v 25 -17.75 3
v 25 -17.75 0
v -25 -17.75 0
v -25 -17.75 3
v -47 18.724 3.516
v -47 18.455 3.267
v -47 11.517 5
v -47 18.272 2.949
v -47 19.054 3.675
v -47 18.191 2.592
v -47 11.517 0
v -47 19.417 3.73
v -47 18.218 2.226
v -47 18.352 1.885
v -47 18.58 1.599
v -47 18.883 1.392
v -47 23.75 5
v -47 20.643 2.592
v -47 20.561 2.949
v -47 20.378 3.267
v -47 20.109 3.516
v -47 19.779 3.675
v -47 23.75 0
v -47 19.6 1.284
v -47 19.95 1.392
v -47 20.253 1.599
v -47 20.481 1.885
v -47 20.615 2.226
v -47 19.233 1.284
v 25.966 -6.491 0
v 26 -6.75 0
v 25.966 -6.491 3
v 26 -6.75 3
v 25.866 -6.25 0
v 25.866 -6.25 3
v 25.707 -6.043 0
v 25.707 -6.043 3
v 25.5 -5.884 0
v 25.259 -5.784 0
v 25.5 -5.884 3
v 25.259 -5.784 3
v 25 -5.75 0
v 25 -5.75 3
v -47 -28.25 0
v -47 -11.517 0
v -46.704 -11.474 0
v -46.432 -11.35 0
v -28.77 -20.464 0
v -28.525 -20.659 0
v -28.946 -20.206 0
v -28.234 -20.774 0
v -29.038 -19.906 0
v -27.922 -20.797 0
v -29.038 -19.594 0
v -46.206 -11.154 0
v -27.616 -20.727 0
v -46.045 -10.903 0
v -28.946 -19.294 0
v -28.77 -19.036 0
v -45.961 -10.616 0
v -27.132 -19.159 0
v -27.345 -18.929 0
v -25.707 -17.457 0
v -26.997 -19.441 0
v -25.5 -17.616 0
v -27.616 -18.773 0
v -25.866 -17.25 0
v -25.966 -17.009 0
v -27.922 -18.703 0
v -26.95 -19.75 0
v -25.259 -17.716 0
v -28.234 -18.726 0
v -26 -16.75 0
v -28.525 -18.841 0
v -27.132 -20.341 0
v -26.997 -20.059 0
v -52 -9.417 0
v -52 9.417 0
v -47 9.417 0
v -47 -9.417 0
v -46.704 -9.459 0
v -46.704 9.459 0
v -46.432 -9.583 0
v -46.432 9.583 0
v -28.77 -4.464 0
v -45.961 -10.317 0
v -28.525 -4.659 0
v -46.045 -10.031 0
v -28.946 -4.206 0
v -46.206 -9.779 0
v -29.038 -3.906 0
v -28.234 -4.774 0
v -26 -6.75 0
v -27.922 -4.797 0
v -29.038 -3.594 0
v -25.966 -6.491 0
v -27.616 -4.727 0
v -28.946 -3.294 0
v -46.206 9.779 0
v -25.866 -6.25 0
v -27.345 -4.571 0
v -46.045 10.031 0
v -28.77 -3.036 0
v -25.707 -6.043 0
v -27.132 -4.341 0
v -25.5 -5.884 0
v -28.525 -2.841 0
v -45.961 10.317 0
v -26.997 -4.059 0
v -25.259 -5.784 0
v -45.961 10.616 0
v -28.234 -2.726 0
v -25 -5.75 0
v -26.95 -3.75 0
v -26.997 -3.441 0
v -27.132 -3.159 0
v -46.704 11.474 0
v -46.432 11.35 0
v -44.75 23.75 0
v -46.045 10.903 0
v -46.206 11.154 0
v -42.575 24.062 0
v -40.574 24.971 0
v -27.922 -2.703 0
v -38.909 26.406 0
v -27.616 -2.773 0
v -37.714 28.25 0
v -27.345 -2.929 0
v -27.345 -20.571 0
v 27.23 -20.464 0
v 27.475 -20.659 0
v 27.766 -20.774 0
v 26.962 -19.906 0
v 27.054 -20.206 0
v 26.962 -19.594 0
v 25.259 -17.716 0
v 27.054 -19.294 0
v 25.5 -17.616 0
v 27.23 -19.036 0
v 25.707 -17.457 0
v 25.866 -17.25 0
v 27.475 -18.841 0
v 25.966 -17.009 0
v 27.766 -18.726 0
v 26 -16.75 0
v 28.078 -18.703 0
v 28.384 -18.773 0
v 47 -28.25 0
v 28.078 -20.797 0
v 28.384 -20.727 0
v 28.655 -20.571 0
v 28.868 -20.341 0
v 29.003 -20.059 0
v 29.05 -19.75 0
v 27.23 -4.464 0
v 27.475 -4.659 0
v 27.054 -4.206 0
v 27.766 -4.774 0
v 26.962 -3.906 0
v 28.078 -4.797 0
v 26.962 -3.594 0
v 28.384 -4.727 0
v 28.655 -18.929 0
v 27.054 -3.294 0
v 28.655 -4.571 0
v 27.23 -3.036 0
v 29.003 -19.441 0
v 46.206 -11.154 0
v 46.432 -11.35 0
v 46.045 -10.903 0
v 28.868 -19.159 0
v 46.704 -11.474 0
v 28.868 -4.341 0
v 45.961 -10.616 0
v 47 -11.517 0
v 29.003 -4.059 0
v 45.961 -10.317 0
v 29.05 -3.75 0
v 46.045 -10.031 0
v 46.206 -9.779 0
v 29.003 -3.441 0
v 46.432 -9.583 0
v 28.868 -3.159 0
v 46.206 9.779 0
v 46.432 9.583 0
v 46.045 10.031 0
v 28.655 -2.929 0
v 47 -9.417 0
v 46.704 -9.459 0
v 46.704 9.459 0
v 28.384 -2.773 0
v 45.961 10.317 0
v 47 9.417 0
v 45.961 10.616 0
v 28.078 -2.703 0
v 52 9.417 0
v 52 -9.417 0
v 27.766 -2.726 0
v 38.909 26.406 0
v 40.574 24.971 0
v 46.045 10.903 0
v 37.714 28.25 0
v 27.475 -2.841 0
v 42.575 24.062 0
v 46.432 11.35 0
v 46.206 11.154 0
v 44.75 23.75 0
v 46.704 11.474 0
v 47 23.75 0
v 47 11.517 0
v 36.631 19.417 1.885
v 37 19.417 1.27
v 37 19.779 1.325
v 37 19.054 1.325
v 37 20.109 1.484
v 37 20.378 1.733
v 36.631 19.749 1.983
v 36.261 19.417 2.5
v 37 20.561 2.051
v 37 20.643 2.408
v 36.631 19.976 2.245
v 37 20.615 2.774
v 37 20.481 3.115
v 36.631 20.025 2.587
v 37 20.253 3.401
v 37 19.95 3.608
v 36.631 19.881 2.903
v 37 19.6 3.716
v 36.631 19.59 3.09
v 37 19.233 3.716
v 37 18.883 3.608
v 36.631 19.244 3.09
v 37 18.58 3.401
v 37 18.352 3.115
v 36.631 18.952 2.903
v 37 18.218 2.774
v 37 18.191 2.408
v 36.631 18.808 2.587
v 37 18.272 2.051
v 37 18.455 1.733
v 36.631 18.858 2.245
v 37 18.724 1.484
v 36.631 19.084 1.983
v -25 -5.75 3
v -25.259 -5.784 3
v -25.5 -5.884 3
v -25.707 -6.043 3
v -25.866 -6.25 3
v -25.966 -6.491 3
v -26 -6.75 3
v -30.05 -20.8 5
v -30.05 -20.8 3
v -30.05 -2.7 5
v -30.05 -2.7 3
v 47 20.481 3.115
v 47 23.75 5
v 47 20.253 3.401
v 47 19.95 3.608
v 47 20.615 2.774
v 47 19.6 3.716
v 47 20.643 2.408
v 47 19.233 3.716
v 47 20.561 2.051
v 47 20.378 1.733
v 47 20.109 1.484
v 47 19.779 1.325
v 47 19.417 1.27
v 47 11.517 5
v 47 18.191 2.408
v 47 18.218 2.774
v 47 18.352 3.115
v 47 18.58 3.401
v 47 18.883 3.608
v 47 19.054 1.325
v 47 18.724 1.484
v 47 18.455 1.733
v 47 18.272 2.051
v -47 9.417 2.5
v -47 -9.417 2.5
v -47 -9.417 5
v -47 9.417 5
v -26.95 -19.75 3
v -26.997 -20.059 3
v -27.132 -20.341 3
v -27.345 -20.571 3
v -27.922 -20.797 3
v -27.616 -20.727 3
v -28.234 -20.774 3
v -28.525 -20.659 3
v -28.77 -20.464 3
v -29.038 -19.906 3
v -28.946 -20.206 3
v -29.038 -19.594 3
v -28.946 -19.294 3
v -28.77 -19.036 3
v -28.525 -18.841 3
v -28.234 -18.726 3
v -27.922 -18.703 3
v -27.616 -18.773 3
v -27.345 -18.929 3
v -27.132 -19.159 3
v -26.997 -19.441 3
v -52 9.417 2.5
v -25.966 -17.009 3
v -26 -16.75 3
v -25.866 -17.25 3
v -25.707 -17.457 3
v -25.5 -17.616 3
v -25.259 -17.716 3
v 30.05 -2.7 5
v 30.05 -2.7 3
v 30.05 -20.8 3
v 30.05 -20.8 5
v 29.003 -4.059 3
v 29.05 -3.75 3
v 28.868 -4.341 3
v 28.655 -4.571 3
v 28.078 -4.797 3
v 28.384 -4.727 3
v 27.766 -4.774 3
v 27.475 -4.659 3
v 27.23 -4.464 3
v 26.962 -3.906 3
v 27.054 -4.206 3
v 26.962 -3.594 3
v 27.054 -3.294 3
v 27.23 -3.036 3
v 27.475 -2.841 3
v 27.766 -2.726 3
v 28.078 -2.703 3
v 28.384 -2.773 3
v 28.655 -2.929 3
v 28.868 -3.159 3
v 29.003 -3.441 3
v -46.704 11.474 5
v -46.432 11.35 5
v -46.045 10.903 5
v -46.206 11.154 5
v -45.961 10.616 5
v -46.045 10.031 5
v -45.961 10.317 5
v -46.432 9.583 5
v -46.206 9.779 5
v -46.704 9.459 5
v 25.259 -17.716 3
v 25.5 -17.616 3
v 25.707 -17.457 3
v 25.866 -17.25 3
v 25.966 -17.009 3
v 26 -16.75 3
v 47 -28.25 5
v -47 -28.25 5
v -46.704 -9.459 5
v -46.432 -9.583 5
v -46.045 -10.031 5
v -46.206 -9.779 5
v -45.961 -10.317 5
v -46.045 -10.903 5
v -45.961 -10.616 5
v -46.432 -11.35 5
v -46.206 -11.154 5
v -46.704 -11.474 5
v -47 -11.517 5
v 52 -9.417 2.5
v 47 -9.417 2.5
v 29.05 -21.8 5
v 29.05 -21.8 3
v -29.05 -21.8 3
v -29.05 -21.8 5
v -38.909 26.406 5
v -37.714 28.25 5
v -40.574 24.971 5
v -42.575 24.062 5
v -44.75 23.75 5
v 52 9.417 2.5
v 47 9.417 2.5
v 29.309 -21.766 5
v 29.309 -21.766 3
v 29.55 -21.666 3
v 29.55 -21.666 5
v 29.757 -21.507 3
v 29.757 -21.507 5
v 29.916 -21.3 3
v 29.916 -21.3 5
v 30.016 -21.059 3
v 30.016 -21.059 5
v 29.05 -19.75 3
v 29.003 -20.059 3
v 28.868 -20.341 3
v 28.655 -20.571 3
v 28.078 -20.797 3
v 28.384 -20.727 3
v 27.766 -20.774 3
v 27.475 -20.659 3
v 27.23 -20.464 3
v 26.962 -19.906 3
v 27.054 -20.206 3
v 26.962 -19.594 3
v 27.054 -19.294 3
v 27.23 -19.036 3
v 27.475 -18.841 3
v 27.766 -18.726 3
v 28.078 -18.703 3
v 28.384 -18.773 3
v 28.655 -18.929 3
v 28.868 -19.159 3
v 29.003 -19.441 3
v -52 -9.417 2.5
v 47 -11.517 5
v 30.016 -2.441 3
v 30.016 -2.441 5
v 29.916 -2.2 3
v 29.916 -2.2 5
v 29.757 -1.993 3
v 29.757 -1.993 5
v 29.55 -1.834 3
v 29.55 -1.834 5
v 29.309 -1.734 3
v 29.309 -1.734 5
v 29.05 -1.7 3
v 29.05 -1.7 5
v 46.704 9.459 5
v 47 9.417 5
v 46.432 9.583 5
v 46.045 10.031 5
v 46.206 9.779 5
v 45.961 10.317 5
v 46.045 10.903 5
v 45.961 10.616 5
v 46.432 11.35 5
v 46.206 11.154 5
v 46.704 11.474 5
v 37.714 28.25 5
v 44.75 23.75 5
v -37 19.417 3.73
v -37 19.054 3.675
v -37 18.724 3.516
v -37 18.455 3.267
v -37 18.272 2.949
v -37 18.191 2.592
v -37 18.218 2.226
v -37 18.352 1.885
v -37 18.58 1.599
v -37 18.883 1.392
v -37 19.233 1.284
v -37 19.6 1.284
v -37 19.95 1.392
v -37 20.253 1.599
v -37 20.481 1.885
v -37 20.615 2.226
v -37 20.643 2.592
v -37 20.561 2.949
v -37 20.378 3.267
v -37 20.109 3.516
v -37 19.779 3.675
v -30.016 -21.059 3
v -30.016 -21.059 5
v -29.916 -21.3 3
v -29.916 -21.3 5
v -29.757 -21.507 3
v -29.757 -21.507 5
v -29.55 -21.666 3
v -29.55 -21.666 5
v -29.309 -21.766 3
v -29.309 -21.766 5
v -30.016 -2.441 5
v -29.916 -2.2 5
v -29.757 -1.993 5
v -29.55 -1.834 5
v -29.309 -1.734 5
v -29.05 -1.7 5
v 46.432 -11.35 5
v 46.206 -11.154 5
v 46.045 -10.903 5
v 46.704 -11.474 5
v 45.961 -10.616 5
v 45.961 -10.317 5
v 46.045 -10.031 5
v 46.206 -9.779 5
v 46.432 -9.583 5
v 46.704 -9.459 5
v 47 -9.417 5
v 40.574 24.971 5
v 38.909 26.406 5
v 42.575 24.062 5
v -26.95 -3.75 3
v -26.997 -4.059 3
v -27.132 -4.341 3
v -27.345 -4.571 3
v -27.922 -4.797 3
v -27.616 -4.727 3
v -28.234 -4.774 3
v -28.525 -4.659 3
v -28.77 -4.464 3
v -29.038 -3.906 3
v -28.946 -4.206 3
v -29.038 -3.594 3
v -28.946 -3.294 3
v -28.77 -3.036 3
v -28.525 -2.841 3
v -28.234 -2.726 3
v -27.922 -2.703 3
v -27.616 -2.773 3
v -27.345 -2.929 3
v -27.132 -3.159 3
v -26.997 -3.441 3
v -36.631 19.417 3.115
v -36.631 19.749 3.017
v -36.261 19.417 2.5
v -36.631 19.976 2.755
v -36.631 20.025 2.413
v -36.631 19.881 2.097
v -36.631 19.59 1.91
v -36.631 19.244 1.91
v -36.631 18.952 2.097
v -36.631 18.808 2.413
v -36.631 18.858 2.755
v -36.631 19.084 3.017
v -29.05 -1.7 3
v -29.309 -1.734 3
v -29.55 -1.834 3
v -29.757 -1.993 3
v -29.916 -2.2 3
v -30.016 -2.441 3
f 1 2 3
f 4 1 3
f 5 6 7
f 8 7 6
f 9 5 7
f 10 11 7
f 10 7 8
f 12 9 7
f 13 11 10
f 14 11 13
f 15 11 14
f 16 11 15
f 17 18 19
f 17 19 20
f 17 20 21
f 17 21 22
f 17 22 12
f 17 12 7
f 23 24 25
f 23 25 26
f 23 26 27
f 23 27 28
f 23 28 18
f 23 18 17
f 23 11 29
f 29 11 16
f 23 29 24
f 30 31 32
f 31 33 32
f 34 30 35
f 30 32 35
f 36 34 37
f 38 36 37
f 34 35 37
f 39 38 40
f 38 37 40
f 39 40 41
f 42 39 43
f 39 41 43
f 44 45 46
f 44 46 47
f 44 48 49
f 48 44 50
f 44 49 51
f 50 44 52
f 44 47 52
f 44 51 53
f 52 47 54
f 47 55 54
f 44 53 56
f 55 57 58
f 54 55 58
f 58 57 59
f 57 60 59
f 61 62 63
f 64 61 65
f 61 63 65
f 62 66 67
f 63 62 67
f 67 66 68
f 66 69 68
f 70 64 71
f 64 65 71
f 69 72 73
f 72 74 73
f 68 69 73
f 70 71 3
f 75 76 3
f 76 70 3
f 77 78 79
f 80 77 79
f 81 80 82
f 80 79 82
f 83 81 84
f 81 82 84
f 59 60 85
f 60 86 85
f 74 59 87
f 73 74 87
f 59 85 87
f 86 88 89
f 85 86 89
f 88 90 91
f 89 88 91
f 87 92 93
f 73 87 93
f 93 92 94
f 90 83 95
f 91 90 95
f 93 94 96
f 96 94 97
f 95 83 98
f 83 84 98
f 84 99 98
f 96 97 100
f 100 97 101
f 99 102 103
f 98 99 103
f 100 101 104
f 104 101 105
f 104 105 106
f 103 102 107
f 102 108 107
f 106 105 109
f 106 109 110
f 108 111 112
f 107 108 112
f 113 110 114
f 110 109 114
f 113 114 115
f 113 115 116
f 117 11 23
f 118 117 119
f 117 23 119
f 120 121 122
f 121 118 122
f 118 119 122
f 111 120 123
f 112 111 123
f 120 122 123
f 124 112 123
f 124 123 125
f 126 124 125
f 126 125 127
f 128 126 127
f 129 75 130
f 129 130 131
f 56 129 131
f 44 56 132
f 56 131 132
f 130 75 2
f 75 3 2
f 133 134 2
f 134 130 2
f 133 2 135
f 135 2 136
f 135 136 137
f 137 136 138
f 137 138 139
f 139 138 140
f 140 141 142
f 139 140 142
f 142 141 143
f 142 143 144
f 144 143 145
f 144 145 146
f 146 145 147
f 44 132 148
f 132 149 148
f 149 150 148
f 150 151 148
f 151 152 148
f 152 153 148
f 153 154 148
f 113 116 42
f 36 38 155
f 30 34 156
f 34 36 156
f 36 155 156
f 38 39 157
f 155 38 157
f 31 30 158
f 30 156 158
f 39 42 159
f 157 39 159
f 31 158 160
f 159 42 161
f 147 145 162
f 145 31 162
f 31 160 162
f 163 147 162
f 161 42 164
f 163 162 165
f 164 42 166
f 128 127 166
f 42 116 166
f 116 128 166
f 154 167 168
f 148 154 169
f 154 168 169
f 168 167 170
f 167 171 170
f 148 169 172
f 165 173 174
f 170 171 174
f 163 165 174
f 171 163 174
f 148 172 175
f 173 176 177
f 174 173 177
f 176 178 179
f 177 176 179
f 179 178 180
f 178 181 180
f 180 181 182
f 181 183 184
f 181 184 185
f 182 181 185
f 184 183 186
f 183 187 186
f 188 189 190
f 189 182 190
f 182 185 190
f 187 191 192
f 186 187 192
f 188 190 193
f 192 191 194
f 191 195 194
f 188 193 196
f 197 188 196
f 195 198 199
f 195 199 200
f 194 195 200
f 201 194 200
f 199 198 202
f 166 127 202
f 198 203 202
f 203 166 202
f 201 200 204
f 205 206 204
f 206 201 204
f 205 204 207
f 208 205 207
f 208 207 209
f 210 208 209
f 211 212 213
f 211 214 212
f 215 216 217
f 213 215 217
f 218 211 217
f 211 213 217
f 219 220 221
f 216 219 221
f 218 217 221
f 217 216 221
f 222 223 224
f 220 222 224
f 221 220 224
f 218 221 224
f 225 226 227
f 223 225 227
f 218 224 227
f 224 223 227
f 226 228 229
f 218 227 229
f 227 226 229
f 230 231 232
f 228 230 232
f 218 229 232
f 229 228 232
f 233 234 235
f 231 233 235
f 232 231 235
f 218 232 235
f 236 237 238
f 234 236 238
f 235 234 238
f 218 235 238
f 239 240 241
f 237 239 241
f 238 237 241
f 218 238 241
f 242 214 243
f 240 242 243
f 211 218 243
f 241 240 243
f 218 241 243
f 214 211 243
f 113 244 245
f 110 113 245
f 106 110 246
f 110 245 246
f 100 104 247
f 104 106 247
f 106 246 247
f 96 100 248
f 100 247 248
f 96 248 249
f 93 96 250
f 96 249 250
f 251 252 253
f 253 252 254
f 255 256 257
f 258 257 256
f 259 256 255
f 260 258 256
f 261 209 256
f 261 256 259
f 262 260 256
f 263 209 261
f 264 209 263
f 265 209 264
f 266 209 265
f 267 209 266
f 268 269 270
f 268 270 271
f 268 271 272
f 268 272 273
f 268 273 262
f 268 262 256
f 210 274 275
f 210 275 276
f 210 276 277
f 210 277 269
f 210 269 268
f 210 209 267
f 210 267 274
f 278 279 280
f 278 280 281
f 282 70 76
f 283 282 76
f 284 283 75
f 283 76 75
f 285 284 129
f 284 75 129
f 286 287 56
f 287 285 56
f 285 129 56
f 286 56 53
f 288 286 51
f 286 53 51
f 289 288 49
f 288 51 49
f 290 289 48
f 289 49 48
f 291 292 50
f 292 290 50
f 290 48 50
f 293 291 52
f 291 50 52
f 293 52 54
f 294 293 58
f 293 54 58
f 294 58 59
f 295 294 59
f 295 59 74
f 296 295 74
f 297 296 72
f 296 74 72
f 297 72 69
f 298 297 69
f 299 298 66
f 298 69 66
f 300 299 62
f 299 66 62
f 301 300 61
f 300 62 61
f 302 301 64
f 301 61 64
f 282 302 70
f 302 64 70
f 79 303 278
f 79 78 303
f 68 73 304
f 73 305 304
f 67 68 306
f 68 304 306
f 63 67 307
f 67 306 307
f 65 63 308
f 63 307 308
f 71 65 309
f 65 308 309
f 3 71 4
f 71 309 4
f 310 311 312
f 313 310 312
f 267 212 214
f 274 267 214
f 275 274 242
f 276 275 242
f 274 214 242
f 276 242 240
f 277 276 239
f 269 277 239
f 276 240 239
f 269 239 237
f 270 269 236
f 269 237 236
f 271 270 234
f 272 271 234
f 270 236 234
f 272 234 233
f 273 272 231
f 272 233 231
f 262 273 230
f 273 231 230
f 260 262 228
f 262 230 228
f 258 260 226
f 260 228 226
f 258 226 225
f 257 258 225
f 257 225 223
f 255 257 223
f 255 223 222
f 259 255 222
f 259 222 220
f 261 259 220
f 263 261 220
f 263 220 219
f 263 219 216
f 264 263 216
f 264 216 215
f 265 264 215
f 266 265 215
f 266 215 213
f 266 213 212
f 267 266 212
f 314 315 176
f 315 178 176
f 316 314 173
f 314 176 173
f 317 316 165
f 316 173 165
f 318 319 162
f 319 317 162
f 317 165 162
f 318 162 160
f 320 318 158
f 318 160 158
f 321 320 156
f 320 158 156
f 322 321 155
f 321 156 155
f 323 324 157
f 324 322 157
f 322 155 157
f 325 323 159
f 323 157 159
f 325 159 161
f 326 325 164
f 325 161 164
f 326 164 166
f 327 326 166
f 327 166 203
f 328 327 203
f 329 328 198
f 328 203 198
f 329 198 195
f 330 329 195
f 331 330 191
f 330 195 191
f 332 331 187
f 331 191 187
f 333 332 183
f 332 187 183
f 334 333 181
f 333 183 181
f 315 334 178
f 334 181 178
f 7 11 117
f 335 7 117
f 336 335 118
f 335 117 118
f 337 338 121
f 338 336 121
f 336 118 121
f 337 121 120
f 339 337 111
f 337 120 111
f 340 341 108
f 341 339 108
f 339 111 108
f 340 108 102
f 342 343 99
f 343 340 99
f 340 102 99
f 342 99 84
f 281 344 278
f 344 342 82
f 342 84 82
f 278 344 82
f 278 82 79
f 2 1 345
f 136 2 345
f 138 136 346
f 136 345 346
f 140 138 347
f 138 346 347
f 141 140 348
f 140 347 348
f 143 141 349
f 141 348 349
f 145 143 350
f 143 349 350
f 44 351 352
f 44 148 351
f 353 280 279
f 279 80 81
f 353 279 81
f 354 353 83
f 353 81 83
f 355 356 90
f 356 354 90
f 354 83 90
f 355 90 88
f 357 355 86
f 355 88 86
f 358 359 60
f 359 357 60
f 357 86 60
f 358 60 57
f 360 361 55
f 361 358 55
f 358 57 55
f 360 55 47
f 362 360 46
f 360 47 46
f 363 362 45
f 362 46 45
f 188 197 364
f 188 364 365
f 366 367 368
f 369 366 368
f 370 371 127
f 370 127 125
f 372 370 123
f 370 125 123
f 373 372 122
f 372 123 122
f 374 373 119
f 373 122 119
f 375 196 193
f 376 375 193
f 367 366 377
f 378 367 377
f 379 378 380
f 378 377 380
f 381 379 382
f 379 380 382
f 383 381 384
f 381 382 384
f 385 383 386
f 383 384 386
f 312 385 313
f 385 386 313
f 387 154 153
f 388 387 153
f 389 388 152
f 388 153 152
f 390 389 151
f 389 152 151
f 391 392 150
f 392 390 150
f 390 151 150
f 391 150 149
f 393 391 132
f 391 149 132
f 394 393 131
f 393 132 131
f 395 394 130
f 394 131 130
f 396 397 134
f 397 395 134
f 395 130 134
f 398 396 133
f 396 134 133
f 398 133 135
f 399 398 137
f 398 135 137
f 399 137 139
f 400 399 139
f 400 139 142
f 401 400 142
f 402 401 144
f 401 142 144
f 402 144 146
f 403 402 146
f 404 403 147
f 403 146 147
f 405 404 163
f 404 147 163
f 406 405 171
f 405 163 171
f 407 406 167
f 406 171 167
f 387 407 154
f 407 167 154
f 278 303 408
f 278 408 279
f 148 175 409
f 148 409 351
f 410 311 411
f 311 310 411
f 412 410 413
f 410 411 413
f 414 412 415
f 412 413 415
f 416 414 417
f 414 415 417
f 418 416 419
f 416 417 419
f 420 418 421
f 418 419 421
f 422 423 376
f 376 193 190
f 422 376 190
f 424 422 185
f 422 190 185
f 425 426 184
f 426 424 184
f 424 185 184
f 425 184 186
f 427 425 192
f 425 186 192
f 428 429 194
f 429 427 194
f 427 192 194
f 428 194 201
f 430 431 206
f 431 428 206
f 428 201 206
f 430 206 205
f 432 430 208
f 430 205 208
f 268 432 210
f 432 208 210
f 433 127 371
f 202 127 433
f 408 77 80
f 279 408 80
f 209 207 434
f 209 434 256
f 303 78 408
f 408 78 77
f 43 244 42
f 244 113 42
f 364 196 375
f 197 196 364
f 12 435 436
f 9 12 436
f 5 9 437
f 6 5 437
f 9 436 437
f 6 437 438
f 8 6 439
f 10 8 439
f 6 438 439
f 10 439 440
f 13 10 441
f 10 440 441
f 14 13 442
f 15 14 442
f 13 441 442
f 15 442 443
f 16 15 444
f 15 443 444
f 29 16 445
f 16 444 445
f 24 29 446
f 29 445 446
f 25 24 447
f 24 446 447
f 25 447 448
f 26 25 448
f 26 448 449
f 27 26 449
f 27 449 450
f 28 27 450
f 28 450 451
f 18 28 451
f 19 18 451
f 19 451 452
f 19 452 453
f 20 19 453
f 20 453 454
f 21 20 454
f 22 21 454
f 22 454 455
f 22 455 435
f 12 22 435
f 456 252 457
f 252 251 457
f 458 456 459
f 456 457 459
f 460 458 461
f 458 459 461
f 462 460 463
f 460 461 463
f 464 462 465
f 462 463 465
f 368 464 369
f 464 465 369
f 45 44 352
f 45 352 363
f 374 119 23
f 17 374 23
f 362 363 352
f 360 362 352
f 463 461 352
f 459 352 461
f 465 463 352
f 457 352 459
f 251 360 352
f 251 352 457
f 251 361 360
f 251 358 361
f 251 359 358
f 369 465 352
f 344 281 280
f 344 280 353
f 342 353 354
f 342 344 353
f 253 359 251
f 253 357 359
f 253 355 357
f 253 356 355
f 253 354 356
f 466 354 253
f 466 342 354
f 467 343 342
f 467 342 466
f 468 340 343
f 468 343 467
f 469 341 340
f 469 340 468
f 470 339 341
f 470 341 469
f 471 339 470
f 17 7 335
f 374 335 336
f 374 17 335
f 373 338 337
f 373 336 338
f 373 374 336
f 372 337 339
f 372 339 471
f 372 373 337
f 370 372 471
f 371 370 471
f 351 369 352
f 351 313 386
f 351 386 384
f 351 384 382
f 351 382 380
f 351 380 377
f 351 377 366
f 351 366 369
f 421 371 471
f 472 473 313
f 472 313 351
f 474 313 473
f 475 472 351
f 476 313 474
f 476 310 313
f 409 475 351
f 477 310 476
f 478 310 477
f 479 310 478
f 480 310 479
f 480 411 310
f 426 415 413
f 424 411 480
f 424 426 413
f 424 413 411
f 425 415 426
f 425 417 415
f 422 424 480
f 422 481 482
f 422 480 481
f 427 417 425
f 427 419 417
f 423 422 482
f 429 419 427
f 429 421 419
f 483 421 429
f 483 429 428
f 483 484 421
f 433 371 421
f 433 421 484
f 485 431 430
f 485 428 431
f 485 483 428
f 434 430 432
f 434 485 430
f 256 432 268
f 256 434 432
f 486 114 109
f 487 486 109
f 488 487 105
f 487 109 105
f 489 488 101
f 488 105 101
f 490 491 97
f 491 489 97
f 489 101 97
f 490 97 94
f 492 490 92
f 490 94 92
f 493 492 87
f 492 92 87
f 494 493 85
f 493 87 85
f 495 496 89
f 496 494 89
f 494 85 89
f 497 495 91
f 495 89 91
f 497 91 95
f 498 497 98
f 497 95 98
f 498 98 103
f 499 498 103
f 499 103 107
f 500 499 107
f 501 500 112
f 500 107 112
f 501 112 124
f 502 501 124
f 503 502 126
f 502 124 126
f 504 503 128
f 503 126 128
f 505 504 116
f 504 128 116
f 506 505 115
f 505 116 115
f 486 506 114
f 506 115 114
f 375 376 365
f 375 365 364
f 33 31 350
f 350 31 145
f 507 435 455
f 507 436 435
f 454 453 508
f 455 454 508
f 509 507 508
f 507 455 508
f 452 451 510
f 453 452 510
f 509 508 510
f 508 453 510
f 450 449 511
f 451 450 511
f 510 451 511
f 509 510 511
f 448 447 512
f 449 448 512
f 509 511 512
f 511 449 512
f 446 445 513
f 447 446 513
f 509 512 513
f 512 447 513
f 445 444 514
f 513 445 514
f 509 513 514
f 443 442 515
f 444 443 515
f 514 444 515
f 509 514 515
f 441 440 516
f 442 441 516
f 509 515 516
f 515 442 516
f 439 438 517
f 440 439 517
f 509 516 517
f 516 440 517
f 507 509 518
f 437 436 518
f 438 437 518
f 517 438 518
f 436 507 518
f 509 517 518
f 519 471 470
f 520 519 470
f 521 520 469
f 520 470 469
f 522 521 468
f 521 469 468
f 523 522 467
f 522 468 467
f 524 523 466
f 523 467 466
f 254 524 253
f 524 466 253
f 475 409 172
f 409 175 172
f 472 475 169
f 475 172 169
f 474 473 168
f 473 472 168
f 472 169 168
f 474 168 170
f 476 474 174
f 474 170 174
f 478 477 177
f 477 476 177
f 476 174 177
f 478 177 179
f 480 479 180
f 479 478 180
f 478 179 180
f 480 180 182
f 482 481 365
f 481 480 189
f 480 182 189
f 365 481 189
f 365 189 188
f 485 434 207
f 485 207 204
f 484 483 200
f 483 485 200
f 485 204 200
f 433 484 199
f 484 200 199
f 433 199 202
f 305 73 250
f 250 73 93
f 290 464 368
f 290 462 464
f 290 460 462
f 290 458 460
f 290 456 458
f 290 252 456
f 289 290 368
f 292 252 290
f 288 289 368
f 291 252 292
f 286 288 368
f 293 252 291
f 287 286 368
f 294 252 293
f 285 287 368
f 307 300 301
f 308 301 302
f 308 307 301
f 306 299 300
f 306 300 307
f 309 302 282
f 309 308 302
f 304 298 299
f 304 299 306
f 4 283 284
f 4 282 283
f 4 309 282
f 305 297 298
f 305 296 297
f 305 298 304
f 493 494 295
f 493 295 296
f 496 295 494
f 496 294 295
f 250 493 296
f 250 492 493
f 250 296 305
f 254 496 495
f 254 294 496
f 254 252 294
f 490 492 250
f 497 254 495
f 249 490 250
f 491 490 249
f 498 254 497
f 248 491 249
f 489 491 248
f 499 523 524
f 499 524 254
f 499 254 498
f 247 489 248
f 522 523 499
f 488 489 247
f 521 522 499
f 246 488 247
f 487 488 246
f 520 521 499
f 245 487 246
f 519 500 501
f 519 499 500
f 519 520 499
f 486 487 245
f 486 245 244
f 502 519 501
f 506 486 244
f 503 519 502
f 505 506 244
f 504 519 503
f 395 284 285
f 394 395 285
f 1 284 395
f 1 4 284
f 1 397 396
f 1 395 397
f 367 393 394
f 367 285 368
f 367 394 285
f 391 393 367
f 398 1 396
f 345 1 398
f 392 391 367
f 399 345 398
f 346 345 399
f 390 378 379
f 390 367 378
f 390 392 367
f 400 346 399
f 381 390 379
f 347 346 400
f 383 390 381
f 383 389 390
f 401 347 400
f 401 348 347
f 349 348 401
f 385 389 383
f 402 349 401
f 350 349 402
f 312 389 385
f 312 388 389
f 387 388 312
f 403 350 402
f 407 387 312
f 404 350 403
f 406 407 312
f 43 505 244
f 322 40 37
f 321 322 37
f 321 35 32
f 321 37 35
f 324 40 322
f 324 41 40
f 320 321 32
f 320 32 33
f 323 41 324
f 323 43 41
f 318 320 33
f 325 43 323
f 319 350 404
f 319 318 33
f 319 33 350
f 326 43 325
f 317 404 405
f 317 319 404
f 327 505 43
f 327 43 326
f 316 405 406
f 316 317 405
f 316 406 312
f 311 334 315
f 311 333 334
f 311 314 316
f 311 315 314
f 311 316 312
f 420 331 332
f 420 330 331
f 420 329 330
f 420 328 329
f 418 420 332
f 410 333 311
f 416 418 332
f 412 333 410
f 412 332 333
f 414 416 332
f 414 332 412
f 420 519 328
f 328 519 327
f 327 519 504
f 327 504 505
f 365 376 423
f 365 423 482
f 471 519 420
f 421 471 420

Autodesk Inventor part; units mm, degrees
ref_plane "YZ Plane" through (0, 0, 0) normal (1, 0, 0) x (0, 1, 0)
ref_plane "XZ Plane" through (0, 0, 0) normal (0, 1, 0) x (-1, 0, 0)
ref_plane "XY Plane" through (0, 0, 0) normal (0, 0, 1) x (1, 0, 0)
sketch "スケッチ1" plane through (0, 0, 0) normal (0, 0, 1) x (1, 0, 0)
  line L0 (-47, 28.25) -> (-37.7144, 28.25)
  line L1 (47, 28.25) -> (47, 23.75)
  line L2 (47, -28.25) -> (-47, -28.25)
  line L3 (-47, -28.25) -> (-47, -11.5167)
  line L4 (-47, 28.25) -> (47, -28.25) construction
  line L5 (47, 28.25) -> (-47, -28.25) construction
  line L6 (0, 28.25) -> (0, -28.25) construction
  line L7 (-52, 9.4167) -> (-52, -9.4167)
  line L8 (-52, 9.4167) -> (-47, 9.4167)
  arc A0 (-47, 9.4167) -> (-47, 11.5167) centre (-47, 10.4667) ccw
  line L9 (-47, 11.5167) -> (-47, 23.75)
  line L10 (-47, -11.5167) -> (-47, 11.5167)
  line L11 (52, 9.4167) -> (52, -9.4167)
  line L12 (52, 9.4167) -> (47, 9.4167)
  arc A1 (47, 11.5167) -> (47, 9.4167) centre (47, 10.4667) ccw
  line L13 (47, 11.5167) -> (47, -11.5167)
  line L14 (47, -11.5167) -> (47, -28.25)
  line L15 (-52, 0) -> (52, 0) construction
  line L16 (-52, -9.4167) -> (-47, -9.4167)
  arc A2 (-47, -11.5167) -> (-47, -9.4167) centre (-47, -10.4667) ccw
  arc A3 (47, -9.4167) -> (47, -11.5167) centre (47, -10.4667) ccw
  line L17 (52, -9.4167) -> (47, -9.4167)
  arc A4 (-47, 24.0838) -> (-37.7144, 28.25) centre (-44.75, 31.5) ccw
  arc A5 (37.7144, 28.25) -> (47, 24.0838) centre (44.75, 31.5) ccw
  line L18 (-47, 24.0838) -> (-47, 28.25)
  line L19 (-37.7144, 28.25) -> (47, 28.25)
  arc A6 (-37.7144, 28.25) -> (-47, 24.0838) centre (-44.75, 31.5) ccw
  arc A7 (47, 24.0838) -> (37.7144, 28.25) centre (44.75, 31.5) ccw
  line L20 (-44.75, 23.75) -> (-47, 23.75)
  line L21 (44.75, 23.75) -> (47, 23.75)
  line L22 (-47, 23.75) -> (-47, 24.0838)
  line L23 (47, 23.75) -> (47, 11.5167)
  line L24 (-30, -1.75) -> (30, -1.75) construction
  line L25 (30, -1.75) -> (30, -21.75) construction
  line L26 (30, -21.75) -> (-30, -21.75) construction
  line L27 (-30, -21.75) -> (-30, -1.75) construction
  line L28 (-30, -1.75) -> (30, -21.75) construction
  line L29 (30, -1.75) -> (-30, -21.75) construction
  circle A8 centre (-28, -3.75) radius 1.05
  line L30 (30, -11.75) -> (-30, -11.75) construction
  circle A9 centre (-28, -19.75) radius 1.05
  circle A10 centre (28, -3.75) radius 1.05
  circle A11 centre (28, -19.75) radius 1.05
  line L31 (-30.05, -1.7) -> (30.05, -1.7)
  line L32 (30.05, -1.7) -> (30.05, -21.8)
  line L33 (30.05, -21.8) -> (-30.05, -21.8)
  line L34 (-30.05, -21.8) -> (-30.05, -1.7)
  line L35 (-30.05, -1.7) -> (30.05, -21.8) construction
  line L36 (30.05, -1.7) -> (-30.05, -21.8) construction
  line L37 (-26, -5.75) -> (26, -5.75)
  line L38 (26, -5.75) -> (26, -17.75)
  line L39 (26, -17.75) -> (-26, -17.75)
  line L40 (-26, -17.75) -> (-26, -5.75)
  line L41 (-26, -5.75) -> (26, -17.75) construction
  line L42 (26, -5.75) -> (-26, -17.75) construction
  point P0 (0, 0)
  point P1 (0, 0)
  point P2 (0, 0)
  point P3 (0, 0)
  point P4 (47, 9.4167)
  point P5 (47, 9.4167)
  point P6 (0, -11.75)
  dimension "d0" = 94
  dimension "d1" = 56.5
  dimension "d10" = 1.05
  dimension "d11" = 5
  dimension "d34" = 18.8333
  dimension "d40" = 31.5
  dimension "d41" = 89.5
  dimension "d42" = 15.5
  dimension "d43" = 52
  dimension "d69" = 60
  dimension "d70" = 20
  dimension "d71" = 2
  dimension "d72" = 2
  dimension "d73" = 2.1
  dimension "d74" = 30
  dimension "d75" = 0.05
  dimension "d76" = 0.05
  dimension "d80" = 4
  dimension "d81" = 4
extrude "押し出し1" add sketch "スケッチ1" along normal blind 5 contours L19 A5 L21 L23 A1 L13 A3 L14 L2 L3 A2 L10 A0 L9 L20 A4
extrude "押し出し2" add sketch "スケッチ1" along normal blind 2.5 contours L10 L16 L7 L8 | L12 L11 L17 L13
sketch "スケッチ2" plane through (47, 11.5167, 0) normal (1, 0, 0) x (0, 0, -1)
  line L0 (0, -23.0333) -> (-5, -23.0333) projected
  line L1 (-2.5, -23.0333) -> (-2.5, -39.7667)
  line L2 (0, -39.7667) -> (-5, -39.7667) projected
  line L3 (0, -2.1) -> (-2.5, -2.1) projected
  line L4 (0, -20.9333) -> (-2.5, -20.9333) projected
  point P0 (0, -11.5167)
  point P1 (-2.5, 7.9)
  dimension "d67" = 10
hole "穴1" at (47, 19.4167, 2.5) direction (-1, 0, 0) diameter 2.459 depth 10 tip angle 118 thread size "M3x0.5" class "6H" standard "ANSI Metric M Profile"
sketch "スケッチ3" plane through (-47, 11.5167, 0) normal (-1, 0, 0) x (0, 0, 1)
  circle A0 centre (2.5, 7.9) radius 1.2295 projected
  circle A1 centre (2.5, -30.9333) radius 1.2295 projected
  point P0 (0, -11.5167)
  point P1 (2.5, 7.9)
hole "穴2" at (-47, 19.4167, 2.5) direction (1, 0, 0) diameter 2.459 depth 10 tip angle 118 thread size "M3x0.5" class "6H" standard "ANSI Metric M Profile"
extrude "押し出し3" add sketch "スケッチ1" along normal blind 3 contours L31 L32 L33 L34
fillet "フィレット1" radius 1 8 edges at (-30.05, -1.7, 4) (-30.05, -21.8, 4) (30.05, -21.8, 4) (30.05, -1.7, 4) (-26, -5.75, 1.5) (-26, -17.75, 1.5) (26, -5.75, 1.5) (26, -17.75, 1.5)
equation "\"d10\" = d4"
equation "\"d4\" = 1.05"
properties part number "Cockpit_horizontal_frame_05" material "アセタール樹脂、黒"
